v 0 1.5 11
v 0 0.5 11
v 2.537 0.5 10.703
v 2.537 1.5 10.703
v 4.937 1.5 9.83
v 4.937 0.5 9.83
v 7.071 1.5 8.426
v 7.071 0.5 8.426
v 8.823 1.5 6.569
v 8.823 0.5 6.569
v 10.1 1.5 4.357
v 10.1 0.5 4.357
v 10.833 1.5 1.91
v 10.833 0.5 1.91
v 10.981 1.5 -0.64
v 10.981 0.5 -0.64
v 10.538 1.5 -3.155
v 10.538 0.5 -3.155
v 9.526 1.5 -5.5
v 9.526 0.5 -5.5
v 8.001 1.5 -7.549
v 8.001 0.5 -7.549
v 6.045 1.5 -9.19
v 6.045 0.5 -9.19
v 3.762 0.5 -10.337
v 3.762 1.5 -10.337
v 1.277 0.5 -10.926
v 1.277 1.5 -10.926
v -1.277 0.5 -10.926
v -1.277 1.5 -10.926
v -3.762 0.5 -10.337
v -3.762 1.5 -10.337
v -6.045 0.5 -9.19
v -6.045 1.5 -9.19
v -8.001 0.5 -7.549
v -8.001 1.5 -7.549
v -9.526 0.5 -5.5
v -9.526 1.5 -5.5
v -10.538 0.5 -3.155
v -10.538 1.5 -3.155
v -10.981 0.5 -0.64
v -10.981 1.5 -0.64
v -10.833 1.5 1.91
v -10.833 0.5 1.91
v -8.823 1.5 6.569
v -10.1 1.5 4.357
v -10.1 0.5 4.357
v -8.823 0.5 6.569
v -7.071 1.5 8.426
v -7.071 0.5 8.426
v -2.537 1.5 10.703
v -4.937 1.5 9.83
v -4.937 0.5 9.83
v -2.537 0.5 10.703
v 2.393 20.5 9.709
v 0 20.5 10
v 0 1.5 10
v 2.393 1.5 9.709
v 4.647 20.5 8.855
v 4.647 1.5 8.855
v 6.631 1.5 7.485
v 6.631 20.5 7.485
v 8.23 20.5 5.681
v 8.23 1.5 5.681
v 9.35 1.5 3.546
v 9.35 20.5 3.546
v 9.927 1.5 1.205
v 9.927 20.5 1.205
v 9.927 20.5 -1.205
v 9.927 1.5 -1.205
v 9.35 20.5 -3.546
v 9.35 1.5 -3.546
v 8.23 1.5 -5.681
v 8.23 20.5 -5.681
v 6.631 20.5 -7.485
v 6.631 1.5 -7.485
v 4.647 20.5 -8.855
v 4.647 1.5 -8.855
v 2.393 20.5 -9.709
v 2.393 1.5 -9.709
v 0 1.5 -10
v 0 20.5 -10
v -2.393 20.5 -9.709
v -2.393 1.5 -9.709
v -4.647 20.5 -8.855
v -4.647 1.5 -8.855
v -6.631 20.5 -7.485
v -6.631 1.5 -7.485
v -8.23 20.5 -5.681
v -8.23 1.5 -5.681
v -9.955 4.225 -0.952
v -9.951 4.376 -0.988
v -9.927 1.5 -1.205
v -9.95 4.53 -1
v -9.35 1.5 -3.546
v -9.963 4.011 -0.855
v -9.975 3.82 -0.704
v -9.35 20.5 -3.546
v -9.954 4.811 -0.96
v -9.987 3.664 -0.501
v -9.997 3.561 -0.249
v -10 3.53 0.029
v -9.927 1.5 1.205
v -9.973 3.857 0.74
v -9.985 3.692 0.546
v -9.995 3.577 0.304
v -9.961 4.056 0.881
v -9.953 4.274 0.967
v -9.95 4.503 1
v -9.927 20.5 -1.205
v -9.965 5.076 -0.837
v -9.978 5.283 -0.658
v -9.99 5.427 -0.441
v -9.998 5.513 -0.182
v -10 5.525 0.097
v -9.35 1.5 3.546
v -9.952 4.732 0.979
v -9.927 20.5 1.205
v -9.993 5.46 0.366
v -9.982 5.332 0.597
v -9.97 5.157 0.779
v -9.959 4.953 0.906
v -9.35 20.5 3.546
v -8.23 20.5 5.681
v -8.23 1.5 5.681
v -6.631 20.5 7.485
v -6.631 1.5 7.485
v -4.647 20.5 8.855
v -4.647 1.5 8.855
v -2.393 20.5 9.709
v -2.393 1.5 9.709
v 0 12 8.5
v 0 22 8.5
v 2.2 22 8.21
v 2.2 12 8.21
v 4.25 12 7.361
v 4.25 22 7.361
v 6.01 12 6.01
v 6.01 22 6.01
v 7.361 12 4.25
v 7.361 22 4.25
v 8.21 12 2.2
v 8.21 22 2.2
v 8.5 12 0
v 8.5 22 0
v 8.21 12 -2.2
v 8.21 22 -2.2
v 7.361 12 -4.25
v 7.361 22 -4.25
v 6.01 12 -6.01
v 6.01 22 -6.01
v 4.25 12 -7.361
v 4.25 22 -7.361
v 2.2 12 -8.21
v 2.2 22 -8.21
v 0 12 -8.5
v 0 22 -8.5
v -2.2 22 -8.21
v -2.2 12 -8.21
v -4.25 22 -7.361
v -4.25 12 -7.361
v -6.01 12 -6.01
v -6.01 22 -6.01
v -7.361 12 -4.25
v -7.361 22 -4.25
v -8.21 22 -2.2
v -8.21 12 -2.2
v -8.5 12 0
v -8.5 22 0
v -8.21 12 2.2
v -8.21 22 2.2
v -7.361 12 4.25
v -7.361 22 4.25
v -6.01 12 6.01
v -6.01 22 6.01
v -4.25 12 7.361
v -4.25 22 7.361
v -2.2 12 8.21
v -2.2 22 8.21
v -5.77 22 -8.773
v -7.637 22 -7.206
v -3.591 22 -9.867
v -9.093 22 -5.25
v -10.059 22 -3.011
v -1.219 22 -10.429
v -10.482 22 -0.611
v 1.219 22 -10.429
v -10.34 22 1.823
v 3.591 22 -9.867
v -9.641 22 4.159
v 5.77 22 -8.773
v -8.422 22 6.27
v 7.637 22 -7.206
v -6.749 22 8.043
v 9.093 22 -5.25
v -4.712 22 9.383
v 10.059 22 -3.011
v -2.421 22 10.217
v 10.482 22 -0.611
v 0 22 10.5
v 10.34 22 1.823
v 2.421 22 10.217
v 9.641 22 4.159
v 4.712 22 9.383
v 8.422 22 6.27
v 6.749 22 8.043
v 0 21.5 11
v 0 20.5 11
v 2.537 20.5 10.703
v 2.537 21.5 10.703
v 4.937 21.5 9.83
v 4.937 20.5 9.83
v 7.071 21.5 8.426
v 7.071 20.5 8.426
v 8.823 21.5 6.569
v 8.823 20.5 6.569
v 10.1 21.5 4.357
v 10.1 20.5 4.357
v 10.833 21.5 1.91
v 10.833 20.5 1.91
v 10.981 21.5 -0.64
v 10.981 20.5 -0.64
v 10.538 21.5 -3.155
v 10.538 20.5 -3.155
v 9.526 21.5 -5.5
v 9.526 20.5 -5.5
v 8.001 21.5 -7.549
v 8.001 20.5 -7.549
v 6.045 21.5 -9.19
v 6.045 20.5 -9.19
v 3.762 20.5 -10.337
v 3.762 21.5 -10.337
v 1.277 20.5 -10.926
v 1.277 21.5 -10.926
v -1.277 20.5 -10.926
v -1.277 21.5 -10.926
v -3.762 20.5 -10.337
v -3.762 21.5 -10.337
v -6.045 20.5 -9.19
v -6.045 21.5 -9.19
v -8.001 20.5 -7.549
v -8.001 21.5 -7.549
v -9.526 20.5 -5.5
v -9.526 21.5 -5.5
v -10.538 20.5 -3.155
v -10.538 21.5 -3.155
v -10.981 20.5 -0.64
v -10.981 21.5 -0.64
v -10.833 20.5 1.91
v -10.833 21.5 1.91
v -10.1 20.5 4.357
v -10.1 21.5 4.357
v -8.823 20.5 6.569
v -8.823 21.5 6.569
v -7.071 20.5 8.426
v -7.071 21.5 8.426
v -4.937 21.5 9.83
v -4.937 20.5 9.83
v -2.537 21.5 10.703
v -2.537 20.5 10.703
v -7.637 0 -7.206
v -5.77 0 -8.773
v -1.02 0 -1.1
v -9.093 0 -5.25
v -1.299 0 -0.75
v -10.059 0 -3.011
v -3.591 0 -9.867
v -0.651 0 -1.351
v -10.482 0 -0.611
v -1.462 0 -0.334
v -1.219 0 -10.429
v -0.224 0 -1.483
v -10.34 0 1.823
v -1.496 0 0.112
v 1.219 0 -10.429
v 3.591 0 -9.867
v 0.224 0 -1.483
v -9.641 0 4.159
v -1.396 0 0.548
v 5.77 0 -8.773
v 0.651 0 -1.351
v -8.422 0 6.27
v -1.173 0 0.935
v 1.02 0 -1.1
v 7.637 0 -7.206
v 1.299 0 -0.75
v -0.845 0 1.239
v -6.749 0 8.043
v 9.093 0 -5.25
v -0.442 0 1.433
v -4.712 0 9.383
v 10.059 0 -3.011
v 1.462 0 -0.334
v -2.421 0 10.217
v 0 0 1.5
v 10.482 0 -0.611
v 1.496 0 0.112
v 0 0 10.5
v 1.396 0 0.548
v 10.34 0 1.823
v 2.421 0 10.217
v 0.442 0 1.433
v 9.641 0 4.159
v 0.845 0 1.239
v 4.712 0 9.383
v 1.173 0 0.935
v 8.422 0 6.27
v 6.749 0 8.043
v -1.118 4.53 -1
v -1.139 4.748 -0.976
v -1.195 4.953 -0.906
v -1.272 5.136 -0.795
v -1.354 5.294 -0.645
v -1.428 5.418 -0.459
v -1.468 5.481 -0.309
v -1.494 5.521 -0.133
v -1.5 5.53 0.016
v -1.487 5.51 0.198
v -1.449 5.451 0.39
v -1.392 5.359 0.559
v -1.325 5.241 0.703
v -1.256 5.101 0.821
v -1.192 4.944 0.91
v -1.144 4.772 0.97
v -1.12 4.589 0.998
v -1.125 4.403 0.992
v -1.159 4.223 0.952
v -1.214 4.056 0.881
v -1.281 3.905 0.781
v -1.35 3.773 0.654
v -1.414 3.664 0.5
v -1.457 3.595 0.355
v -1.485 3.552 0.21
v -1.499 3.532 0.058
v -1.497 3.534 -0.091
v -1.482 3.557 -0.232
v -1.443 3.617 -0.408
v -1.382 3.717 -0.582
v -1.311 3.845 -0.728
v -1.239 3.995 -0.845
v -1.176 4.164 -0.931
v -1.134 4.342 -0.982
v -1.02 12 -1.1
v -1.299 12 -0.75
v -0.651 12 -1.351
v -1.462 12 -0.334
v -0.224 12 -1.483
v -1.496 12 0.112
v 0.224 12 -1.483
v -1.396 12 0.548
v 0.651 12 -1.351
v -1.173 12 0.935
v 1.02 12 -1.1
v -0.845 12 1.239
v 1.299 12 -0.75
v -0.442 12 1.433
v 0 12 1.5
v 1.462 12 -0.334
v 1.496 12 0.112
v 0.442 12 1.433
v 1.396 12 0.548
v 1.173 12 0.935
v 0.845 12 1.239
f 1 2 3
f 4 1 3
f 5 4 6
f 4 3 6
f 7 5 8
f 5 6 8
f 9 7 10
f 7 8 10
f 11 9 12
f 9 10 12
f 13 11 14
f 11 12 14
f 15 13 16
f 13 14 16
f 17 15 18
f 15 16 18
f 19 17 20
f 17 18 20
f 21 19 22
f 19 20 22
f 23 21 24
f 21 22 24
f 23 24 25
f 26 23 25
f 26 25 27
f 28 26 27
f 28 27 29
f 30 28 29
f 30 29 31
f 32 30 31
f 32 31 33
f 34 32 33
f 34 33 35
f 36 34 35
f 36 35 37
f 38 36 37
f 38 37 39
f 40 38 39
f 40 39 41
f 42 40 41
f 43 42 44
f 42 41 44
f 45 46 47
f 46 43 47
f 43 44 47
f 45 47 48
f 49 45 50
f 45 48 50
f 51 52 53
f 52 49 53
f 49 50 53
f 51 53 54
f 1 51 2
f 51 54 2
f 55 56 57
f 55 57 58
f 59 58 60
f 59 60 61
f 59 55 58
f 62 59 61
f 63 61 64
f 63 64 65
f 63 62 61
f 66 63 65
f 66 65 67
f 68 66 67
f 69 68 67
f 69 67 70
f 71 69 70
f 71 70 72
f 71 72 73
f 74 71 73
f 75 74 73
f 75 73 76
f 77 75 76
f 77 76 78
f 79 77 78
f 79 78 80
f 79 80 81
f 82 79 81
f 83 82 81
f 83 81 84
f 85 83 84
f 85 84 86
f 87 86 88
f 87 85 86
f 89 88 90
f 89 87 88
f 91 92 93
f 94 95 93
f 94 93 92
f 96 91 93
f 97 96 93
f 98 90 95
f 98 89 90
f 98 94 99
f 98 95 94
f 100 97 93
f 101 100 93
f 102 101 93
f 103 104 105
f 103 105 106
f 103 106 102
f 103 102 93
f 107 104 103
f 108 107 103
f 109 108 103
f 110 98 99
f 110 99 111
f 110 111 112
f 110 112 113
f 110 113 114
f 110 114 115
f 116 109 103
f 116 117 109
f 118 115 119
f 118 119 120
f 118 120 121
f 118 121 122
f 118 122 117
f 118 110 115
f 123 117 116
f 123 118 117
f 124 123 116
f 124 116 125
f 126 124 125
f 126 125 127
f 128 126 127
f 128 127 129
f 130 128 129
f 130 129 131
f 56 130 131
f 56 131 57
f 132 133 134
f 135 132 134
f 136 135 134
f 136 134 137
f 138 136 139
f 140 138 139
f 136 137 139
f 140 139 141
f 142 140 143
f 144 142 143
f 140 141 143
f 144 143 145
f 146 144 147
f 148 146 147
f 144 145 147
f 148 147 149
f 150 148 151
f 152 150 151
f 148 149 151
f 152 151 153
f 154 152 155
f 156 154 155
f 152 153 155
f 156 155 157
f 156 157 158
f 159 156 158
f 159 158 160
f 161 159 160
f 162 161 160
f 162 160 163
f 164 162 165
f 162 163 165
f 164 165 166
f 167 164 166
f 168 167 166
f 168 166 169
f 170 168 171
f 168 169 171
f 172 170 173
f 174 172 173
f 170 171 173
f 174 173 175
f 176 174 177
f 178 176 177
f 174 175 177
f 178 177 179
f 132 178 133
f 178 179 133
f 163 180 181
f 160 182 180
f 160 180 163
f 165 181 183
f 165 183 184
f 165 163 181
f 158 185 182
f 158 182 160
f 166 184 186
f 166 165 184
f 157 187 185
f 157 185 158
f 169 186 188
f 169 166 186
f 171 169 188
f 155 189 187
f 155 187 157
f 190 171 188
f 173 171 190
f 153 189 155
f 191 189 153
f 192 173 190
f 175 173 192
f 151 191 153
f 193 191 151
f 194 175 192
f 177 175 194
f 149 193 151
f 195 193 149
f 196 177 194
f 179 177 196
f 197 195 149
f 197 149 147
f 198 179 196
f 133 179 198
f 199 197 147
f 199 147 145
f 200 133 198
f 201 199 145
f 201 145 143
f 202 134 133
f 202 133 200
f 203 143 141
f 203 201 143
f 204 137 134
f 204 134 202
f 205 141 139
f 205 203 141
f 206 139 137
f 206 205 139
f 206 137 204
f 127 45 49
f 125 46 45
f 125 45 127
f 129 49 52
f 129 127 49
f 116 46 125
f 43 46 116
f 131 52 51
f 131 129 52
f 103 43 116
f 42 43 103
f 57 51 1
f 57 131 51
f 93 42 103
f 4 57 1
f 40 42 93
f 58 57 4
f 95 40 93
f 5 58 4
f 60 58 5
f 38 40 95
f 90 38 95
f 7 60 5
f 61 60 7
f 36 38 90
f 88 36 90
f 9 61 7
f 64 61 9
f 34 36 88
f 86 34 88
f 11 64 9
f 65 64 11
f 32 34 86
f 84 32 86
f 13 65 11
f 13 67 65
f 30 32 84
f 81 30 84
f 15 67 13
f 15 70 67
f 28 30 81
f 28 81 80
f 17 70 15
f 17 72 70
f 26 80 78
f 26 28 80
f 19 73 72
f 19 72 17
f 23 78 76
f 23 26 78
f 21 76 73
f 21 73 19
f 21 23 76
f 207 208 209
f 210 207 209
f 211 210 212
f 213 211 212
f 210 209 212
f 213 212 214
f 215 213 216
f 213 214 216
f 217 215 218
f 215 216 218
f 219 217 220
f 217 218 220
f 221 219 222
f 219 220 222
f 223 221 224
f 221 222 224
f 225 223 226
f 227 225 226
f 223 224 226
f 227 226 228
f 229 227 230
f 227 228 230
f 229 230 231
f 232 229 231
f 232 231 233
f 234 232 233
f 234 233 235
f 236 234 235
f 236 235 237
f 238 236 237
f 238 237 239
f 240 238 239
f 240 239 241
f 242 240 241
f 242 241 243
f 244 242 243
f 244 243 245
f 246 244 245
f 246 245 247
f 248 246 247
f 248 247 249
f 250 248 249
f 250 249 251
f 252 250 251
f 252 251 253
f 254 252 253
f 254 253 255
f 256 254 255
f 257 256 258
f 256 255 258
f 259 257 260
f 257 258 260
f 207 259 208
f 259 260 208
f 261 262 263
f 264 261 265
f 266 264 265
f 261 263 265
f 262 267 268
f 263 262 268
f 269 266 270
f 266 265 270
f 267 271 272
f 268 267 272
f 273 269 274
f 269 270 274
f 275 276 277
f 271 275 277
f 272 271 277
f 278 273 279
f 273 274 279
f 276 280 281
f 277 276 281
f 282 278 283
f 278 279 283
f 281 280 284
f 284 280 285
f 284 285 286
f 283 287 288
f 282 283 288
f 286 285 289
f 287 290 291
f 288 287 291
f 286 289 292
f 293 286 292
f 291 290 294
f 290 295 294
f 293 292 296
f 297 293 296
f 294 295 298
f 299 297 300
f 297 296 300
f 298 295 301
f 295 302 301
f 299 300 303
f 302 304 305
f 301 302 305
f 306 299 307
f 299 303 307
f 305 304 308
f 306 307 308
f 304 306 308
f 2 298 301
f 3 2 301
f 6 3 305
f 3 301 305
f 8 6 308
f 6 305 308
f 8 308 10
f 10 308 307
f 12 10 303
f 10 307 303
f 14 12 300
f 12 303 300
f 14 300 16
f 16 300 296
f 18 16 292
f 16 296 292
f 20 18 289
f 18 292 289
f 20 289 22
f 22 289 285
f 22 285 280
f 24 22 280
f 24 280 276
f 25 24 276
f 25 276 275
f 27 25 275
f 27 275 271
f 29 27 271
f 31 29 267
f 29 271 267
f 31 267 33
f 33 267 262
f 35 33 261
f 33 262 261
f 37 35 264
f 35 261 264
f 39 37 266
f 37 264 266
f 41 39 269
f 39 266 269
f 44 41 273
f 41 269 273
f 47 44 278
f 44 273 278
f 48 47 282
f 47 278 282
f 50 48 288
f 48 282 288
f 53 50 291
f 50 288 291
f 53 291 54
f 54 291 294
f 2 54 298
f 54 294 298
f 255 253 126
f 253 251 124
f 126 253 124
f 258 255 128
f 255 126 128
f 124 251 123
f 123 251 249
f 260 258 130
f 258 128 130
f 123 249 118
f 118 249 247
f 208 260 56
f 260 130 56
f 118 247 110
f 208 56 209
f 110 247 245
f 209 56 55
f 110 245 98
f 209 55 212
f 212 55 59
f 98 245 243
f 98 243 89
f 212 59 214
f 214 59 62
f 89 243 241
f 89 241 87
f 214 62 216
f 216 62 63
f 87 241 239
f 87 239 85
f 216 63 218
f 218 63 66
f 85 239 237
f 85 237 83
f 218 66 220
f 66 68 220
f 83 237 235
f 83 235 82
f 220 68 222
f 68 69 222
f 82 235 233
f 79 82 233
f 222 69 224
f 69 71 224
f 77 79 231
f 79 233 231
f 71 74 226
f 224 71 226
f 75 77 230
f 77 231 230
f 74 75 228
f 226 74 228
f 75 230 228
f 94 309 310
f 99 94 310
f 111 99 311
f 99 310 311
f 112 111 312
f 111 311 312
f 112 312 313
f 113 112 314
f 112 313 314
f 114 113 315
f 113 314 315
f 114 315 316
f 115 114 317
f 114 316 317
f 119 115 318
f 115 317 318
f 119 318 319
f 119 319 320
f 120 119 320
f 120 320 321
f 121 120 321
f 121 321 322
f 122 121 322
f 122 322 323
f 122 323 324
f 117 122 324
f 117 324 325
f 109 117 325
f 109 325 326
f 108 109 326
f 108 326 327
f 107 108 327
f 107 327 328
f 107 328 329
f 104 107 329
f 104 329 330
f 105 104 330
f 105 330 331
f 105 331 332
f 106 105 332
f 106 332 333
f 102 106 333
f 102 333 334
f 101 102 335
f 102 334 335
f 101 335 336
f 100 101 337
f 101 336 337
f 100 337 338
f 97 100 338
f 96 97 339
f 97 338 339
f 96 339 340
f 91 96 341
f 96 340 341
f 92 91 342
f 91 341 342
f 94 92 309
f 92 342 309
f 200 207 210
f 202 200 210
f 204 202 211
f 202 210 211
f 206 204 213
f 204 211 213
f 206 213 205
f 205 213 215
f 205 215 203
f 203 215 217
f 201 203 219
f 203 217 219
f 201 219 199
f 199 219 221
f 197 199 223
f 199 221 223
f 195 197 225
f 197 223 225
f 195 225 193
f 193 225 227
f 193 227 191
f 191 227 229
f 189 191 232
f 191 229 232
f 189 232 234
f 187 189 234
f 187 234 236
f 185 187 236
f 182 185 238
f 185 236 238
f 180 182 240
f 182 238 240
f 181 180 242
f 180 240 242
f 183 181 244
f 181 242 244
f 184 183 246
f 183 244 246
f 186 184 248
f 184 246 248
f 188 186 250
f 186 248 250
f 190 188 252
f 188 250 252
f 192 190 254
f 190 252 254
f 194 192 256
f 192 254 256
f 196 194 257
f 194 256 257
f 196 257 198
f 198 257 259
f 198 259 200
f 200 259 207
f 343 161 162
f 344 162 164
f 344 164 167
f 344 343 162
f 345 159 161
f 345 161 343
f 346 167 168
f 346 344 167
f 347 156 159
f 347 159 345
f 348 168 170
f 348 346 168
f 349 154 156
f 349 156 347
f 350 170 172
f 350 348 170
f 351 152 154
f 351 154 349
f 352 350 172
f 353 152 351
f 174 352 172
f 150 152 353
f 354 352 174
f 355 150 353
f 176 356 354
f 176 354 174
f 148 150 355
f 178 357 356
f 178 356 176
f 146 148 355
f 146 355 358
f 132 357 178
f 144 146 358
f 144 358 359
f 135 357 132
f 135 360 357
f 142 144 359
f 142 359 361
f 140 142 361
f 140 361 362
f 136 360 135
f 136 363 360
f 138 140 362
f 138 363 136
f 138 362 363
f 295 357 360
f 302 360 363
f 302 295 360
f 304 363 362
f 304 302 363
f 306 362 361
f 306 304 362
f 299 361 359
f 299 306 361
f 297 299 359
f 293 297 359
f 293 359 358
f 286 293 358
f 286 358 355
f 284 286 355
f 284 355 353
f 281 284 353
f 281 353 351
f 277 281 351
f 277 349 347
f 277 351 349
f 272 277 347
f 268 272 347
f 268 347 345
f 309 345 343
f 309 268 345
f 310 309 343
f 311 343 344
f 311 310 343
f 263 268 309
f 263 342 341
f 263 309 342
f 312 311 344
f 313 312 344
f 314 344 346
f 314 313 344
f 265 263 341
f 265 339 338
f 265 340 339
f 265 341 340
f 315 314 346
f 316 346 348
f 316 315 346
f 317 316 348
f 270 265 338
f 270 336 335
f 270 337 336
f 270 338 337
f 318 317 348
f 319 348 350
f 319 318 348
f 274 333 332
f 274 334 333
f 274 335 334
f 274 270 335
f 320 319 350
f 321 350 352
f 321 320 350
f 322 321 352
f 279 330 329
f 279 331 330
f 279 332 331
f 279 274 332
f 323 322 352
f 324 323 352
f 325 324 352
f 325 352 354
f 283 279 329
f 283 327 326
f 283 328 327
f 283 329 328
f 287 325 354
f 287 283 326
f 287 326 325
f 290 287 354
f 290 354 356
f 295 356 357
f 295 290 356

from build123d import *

# Parameters (mm, degrees)
SKETCH_1_R          = 11
SKETCH_1_R_2        = 1.5
EXTRUDE_1_DEPTH     = 22
CUT_EXTRUDE_START   = -1.5
SKETCH_2_R          = 12.5
SKETCH_2_R_2        = 10
CUT_EXTRUDE_1_DEPTH = 19
SKETCH_3_R          = 1
CUT_EXTRUDE_2_DEPTH = 18
CHAMFER_1_SIZE      = 0.5
CHAMFER_2_SIZE      = 0.5
SKETCH_4_R          = 8.5
CUT_EXTRUDE_3_DEPTH = 10


with BuildPart() as part:
    # Эскиз1 → Бобышка-Вытянуть1 (new body)
    with BuildSketch(Plane(origin=(0, 0, 0), x_dir=(1, 0, 0), z_dir=(0, 1, 0))):
        with Locations(Location((0, 0, 0), (0, 0, 270))):
            Circle(SKETCH_1_R)
        with Locations(Location((0, 0, 0), (0, 0, 270))):
            Circle(SKETCH_1_R_2, mode=Mode.SUBTRACT)
    extrude(amount=EXTRUDE_1_DEPTH)

    # Эскиз2 → Вырез-Вытянуть1 (cut)
    with BuildSketch(Plane(origin=(0, 22, 0), x_dir=(1, 0, 0), z_dir=(0, 1, 0)).offset(CUT_EXTRUDE_START)):
        Circle(SKETCH_2_R)
        with Locations(Location((0, 0, 0), (0, 0, 270))):
            Circle(SKETCH_2_R_2, mode=Mode.SUBTRACT)
    extrude(amount=-CUT_EXTRUDE_1_DEPTH, mode=Mode.SUBTRACT)

    # Эскиз3 → Вырез-Вытянуть2 (cut)
    with BuildSketch(Plane(origin=(0, 0, 0), x_dir=(0, 0, -1), z_dir=(1, 0, 0))):
        with Locations((0, 4.529870325)):
            Circle(SKETCH_3_R)
    extrude(amount=-CUT_EXTRUDE_2_DEPTH, mode=Mode.SUBTRACT)

    # Фаска1
    chamfer_1_edges = [part.edges().sort_by_distance(p)[0] for p in [
        (0, 0, -11),
    ]]
    chamfer(chamfer_1_edges, length=CHAMFER_1_SIZE)

    # Фаска2
    chamfer_2_edges = [part.edges().sort_by_distance(p)[0] for p in [
        (0, 22, -11),
    ]]
    chamfer(chamfer_2_edges, length=CHAMFER_2_SIZE)

    # Эскиз4 → Вырез-Вытянуть3 (cut)
    with BuildSketch(Plane(origin=(0, 22, 0), x_dir=(1, 0, 0), z_dir=(0, 1, 0))):
        with Locations(Location((0, 0, 0), (0, 0, 270))):
            Circle(SKETCH_4_R)
    extrude(amount=-CUT_EXTRUDE_3_DEPTH, mode=Mode.SUBTRACT)


solid = part.part
